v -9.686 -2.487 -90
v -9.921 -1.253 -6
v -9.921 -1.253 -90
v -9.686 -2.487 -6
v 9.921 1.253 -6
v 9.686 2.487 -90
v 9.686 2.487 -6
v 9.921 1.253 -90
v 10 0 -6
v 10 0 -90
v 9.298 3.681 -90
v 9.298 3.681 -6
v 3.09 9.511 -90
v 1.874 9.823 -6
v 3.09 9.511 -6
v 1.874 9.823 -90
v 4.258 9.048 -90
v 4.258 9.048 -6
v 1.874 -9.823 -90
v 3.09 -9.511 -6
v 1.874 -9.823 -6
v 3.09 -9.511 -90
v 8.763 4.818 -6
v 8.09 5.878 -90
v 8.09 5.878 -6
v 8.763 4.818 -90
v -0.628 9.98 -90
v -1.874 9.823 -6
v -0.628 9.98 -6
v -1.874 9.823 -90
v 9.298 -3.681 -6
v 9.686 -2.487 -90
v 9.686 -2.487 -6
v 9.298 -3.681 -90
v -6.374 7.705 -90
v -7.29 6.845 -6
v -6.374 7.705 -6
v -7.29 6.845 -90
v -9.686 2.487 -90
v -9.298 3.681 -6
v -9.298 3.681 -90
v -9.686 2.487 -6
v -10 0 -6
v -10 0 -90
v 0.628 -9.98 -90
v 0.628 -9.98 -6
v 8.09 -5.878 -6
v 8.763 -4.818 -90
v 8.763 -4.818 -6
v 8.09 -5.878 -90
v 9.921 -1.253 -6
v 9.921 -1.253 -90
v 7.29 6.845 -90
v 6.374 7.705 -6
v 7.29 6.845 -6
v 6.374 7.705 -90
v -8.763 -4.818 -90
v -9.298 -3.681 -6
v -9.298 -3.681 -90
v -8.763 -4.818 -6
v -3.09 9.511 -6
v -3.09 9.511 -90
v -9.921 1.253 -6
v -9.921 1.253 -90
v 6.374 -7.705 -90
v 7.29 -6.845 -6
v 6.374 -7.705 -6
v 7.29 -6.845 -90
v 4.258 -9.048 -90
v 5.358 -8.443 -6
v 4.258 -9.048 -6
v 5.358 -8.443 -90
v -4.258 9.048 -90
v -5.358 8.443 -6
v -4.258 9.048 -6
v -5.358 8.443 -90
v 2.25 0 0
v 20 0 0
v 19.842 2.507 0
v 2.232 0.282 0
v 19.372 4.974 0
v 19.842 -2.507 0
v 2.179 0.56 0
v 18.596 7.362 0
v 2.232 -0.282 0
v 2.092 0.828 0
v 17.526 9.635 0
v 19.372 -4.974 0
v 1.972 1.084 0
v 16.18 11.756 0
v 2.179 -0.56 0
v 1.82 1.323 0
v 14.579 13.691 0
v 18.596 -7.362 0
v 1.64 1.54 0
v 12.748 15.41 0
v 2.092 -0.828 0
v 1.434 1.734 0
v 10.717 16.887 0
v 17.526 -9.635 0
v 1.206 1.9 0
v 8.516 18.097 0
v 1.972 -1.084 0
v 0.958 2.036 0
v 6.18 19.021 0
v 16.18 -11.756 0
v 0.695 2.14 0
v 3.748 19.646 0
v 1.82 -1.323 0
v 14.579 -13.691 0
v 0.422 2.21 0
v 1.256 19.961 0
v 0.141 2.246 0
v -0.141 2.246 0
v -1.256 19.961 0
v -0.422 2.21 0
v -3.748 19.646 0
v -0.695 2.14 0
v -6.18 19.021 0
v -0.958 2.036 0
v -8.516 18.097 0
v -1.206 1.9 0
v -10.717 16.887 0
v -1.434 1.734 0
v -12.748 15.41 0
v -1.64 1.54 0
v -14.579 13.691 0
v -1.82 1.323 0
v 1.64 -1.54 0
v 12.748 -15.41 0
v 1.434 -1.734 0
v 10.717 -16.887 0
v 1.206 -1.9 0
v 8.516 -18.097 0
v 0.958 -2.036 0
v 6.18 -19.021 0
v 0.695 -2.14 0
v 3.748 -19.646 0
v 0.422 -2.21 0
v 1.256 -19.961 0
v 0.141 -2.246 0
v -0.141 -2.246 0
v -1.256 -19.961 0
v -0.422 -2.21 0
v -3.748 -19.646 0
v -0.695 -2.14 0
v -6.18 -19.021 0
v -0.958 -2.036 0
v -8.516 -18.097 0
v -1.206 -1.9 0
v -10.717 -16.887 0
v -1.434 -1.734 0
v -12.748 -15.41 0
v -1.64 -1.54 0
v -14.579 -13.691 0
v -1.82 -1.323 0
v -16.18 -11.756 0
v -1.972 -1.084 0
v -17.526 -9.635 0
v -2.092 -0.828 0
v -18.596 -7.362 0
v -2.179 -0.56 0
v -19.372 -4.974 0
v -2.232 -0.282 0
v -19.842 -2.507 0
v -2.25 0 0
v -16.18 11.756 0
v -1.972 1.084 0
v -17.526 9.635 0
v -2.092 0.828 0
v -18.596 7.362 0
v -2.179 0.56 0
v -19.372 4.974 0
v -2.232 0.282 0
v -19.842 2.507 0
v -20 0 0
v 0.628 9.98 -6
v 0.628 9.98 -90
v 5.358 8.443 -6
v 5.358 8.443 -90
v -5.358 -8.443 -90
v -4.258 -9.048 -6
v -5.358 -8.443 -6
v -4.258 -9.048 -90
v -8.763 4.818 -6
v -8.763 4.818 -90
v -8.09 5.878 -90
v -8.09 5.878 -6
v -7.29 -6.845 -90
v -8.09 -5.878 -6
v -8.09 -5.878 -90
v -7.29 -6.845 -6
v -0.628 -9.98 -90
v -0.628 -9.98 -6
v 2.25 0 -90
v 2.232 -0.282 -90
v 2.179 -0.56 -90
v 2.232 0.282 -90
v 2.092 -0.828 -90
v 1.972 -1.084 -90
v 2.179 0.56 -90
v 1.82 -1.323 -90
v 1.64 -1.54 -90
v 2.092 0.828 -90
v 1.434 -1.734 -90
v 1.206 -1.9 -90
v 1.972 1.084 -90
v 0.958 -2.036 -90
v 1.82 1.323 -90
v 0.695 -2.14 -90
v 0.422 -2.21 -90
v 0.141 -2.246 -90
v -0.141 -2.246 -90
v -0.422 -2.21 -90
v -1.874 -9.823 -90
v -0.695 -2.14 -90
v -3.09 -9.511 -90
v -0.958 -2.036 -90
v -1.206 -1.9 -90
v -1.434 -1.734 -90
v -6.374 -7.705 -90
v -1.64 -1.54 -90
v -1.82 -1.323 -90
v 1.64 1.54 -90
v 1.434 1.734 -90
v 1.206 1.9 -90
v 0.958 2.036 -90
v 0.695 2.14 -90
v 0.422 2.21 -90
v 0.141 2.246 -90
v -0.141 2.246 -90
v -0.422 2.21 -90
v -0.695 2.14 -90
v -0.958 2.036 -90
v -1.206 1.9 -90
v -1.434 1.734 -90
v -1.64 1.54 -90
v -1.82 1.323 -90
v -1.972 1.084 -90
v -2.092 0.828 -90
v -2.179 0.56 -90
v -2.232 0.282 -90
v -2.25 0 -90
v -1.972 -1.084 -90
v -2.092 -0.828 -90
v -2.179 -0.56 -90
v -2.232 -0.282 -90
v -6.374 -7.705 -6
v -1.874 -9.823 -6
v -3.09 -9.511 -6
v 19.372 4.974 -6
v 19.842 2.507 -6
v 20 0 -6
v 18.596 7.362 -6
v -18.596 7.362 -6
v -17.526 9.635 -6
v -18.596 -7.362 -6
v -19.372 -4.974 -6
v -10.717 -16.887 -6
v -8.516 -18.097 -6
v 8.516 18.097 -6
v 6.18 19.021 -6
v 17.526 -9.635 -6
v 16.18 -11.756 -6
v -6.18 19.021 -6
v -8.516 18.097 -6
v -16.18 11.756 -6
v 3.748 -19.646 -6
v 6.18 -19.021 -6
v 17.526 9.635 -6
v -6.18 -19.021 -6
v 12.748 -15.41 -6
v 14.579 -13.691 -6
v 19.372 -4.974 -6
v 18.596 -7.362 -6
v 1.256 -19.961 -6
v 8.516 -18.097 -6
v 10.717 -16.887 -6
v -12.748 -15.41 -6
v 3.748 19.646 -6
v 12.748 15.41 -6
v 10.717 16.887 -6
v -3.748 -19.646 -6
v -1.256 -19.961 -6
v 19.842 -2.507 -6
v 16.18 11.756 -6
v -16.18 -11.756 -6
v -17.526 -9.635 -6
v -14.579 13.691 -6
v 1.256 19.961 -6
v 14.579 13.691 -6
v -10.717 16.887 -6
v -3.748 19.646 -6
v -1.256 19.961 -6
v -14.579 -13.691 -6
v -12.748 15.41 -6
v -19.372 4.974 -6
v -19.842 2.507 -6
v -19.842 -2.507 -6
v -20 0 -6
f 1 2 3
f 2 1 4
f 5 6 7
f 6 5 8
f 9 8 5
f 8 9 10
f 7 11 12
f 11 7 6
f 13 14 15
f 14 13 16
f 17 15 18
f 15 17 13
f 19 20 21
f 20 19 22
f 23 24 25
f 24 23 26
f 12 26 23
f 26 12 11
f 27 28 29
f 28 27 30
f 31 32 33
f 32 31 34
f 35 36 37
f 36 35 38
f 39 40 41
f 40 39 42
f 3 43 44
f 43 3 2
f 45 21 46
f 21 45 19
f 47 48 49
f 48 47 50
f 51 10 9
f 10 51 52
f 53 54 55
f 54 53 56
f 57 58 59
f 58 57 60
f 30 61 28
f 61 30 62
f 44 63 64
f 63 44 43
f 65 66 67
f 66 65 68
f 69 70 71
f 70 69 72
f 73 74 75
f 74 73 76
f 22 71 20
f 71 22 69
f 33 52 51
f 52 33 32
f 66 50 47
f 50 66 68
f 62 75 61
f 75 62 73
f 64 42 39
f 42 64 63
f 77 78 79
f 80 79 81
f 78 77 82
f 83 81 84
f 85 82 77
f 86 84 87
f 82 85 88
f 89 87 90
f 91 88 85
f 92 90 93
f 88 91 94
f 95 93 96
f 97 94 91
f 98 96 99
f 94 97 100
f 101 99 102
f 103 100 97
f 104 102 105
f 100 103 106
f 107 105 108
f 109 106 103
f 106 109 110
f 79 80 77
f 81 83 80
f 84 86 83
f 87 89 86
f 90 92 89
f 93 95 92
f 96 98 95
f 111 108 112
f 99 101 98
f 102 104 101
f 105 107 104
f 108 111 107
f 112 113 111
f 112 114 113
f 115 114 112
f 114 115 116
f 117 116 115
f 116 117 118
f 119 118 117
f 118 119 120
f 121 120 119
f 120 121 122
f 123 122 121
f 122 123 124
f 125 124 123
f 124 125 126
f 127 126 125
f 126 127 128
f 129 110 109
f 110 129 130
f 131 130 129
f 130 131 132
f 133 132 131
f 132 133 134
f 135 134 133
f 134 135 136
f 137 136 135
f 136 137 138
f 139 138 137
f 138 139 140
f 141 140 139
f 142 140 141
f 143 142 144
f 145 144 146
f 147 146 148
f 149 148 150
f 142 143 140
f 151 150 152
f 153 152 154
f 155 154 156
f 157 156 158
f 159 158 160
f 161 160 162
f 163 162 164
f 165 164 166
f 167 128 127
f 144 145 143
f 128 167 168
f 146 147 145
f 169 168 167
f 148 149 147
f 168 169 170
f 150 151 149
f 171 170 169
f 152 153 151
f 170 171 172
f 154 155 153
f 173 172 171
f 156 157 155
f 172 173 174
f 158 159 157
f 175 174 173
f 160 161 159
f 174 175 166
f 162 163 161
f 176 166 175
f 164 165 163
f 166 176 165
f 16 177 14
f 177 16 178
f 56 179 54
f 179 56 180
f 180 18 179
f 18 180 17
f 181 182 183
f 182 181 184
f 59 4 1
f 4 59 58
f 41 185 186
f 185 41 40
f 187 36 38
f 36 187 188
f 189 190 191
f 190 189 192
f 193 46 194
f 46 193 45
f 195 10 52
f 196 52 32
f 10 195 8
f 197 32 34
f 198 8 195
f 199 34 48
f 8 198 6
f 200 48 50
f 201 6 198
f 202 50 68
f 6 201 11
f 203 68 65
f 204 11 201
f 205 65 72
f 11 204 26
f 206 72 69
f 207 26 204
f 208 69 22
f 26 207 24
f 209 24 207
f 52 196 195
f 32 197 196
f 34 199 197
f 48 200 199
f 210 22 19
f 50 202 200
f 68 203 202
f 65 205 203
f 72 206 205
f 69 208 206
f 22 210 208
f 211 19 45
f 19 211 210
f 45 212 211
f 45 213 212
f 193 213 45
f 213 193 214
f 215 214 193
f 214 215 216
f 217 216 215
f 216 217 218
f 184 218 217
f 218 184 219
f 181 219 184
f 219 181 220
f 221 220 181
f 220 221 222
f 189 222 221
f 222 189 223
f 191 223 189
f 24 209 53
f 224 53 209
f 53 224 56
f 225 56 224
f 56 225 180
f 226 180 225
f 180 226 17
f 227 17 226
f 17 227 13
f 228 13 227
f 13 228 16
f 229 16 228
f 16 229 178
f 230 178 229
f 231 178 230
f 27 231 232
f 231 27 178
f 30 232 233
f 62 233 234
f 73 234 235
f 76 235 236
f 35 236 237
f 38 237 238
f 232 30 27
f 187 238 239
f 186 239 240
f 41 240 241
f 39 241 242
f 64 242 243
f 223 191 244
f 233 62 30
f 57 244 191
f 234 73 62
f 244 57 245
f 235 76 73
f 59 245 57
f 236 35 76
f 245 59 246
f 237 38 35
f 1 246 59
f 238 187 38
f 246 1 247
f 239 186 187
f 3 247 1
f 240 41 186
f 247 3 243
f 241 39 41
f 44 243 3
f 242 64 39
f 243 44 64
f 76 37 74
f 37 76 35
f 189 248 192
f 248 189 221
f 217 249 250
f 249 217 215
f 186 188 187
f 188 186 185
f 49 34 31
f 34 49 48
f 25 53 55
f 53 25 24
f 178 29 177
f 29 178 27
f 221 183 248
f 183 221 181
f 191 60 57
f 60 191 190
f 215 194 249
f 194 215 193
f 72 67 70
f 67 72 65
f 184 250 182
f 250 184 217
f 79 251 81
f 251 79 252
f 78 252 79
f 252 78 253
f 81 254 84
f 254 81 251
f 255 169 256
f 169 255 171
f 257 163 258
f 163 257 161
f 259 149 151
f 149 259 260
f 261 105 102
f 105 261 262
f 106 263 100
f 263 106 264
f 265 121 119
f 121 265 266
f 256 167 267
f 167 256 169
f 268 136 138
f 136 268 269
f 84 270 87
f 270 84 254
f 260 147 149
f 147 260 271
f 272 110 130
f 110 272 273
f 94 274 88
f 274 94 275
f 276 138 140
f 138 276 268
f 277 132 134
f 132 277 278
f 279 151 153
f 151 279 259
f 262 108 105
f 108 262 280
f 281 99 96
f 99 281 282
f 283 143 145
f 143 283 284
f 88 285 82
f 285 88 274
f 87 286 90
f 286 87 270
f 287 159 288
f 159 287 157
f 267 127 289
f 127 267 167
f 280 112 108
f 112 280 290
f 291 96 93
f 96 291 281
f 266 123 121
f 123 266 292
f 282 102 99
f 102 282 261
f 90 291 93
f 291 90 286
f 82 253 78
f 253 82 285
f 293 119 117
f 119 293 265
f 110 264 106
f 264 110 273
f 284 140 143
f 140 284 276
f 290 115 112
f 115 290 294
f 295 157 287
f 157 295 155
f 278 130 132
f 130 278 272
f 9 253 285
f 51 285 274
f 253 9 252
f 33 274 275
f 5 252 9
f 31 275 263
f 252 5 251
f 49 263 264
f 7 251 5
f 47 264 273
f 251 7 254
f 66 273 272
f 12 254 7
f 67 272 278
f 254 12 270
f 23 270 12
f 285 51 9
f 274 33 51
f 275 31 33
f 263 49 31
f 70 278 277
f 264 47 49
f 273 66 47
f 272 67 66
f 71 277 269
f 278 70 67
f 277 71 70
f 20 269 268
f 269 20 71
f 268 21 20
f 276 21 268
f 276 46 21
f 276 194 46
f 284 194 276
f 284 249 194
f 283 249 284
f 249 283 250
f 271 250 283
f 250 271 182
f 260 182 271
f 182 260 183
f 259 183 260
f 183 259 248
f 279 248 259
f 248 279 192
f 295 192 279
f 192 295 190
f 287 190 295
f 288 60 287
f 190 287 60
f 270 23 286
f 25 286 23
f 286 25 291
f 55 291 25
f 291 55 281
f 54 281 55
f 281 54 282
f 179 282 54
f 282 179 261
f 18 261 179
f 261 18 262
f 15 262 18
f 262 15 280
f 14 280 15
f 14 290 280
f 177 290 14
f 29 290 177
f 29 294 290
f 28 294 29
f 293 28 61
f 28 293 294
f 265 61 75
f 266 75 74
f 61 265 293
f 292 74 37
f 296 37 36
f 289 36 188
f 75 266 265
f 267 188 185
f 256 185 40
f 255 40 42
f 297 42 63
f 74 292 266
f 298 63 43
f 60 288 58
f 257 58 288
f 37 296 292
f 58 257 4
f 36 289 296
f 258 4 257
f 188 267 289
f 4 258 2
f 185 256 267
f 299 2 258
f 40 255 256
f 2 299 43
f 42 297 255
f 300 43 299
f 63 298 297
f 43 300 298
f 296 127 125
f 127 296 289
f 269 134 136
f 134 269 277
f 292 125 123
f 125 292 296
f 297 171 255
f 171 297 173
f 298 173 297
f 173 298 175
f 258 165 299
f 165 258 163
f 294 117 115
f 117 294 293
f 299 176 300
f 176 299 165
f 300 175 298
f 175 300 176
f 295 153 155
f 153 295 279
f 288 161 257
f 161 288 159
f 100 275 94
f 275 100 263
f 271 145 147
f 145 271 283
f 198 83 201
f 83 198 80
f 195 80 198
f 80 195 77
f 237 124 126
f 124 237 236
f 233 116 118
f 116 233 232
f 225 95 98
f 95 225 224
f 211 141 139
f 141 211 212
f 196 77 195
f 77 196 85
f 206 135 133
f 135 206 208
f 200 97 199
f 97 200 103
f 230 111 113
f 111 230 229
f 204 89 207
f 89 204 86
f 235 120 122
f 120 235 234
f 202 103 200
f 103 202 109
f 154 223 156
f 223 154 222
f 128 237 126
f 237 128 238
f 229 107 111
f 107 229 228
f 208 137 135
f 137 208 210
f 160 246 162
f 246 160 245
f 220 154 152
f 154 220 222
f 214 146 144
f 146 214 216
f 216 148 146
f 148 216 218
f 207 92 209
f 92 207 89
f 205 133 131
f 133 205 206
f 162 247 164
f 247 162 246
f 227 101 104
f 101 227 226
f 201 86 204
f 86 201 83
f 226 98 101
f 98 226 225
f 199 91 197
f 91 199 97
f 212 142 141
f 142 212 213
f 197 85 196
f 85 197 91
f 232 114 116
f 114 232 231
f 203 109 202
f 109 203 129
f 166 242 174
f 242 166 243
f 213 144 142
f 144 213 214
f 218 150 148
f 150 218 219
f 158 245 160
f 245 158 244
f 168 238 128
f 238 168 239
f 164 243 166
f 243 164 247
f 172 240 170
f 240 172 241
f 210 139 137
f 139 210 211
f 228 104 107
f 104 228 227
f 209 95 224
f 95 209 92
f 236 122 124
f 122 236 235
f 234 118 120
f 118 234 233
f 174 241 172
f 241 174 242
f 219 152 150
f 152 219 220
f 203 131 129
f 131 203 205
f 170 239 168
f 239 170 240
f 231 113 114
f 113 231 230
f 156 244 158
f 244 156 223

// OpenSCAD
$fn = 50;


difference() {
	union() {
		translate(v = [0, 0, -90.0000000000]) {
			cylinder(h = 90, r = 10.0000000000);
		}
		translate(v = [0, 0, -6.0000000000]) {
			cylinder(h = 6, r = 20.0000000000);
		}
	}
	union() {
		#translate(v = [0, 0, -90]) {
			cylinder(h = 90, r = 2.2500000000);
		}
	}
}
